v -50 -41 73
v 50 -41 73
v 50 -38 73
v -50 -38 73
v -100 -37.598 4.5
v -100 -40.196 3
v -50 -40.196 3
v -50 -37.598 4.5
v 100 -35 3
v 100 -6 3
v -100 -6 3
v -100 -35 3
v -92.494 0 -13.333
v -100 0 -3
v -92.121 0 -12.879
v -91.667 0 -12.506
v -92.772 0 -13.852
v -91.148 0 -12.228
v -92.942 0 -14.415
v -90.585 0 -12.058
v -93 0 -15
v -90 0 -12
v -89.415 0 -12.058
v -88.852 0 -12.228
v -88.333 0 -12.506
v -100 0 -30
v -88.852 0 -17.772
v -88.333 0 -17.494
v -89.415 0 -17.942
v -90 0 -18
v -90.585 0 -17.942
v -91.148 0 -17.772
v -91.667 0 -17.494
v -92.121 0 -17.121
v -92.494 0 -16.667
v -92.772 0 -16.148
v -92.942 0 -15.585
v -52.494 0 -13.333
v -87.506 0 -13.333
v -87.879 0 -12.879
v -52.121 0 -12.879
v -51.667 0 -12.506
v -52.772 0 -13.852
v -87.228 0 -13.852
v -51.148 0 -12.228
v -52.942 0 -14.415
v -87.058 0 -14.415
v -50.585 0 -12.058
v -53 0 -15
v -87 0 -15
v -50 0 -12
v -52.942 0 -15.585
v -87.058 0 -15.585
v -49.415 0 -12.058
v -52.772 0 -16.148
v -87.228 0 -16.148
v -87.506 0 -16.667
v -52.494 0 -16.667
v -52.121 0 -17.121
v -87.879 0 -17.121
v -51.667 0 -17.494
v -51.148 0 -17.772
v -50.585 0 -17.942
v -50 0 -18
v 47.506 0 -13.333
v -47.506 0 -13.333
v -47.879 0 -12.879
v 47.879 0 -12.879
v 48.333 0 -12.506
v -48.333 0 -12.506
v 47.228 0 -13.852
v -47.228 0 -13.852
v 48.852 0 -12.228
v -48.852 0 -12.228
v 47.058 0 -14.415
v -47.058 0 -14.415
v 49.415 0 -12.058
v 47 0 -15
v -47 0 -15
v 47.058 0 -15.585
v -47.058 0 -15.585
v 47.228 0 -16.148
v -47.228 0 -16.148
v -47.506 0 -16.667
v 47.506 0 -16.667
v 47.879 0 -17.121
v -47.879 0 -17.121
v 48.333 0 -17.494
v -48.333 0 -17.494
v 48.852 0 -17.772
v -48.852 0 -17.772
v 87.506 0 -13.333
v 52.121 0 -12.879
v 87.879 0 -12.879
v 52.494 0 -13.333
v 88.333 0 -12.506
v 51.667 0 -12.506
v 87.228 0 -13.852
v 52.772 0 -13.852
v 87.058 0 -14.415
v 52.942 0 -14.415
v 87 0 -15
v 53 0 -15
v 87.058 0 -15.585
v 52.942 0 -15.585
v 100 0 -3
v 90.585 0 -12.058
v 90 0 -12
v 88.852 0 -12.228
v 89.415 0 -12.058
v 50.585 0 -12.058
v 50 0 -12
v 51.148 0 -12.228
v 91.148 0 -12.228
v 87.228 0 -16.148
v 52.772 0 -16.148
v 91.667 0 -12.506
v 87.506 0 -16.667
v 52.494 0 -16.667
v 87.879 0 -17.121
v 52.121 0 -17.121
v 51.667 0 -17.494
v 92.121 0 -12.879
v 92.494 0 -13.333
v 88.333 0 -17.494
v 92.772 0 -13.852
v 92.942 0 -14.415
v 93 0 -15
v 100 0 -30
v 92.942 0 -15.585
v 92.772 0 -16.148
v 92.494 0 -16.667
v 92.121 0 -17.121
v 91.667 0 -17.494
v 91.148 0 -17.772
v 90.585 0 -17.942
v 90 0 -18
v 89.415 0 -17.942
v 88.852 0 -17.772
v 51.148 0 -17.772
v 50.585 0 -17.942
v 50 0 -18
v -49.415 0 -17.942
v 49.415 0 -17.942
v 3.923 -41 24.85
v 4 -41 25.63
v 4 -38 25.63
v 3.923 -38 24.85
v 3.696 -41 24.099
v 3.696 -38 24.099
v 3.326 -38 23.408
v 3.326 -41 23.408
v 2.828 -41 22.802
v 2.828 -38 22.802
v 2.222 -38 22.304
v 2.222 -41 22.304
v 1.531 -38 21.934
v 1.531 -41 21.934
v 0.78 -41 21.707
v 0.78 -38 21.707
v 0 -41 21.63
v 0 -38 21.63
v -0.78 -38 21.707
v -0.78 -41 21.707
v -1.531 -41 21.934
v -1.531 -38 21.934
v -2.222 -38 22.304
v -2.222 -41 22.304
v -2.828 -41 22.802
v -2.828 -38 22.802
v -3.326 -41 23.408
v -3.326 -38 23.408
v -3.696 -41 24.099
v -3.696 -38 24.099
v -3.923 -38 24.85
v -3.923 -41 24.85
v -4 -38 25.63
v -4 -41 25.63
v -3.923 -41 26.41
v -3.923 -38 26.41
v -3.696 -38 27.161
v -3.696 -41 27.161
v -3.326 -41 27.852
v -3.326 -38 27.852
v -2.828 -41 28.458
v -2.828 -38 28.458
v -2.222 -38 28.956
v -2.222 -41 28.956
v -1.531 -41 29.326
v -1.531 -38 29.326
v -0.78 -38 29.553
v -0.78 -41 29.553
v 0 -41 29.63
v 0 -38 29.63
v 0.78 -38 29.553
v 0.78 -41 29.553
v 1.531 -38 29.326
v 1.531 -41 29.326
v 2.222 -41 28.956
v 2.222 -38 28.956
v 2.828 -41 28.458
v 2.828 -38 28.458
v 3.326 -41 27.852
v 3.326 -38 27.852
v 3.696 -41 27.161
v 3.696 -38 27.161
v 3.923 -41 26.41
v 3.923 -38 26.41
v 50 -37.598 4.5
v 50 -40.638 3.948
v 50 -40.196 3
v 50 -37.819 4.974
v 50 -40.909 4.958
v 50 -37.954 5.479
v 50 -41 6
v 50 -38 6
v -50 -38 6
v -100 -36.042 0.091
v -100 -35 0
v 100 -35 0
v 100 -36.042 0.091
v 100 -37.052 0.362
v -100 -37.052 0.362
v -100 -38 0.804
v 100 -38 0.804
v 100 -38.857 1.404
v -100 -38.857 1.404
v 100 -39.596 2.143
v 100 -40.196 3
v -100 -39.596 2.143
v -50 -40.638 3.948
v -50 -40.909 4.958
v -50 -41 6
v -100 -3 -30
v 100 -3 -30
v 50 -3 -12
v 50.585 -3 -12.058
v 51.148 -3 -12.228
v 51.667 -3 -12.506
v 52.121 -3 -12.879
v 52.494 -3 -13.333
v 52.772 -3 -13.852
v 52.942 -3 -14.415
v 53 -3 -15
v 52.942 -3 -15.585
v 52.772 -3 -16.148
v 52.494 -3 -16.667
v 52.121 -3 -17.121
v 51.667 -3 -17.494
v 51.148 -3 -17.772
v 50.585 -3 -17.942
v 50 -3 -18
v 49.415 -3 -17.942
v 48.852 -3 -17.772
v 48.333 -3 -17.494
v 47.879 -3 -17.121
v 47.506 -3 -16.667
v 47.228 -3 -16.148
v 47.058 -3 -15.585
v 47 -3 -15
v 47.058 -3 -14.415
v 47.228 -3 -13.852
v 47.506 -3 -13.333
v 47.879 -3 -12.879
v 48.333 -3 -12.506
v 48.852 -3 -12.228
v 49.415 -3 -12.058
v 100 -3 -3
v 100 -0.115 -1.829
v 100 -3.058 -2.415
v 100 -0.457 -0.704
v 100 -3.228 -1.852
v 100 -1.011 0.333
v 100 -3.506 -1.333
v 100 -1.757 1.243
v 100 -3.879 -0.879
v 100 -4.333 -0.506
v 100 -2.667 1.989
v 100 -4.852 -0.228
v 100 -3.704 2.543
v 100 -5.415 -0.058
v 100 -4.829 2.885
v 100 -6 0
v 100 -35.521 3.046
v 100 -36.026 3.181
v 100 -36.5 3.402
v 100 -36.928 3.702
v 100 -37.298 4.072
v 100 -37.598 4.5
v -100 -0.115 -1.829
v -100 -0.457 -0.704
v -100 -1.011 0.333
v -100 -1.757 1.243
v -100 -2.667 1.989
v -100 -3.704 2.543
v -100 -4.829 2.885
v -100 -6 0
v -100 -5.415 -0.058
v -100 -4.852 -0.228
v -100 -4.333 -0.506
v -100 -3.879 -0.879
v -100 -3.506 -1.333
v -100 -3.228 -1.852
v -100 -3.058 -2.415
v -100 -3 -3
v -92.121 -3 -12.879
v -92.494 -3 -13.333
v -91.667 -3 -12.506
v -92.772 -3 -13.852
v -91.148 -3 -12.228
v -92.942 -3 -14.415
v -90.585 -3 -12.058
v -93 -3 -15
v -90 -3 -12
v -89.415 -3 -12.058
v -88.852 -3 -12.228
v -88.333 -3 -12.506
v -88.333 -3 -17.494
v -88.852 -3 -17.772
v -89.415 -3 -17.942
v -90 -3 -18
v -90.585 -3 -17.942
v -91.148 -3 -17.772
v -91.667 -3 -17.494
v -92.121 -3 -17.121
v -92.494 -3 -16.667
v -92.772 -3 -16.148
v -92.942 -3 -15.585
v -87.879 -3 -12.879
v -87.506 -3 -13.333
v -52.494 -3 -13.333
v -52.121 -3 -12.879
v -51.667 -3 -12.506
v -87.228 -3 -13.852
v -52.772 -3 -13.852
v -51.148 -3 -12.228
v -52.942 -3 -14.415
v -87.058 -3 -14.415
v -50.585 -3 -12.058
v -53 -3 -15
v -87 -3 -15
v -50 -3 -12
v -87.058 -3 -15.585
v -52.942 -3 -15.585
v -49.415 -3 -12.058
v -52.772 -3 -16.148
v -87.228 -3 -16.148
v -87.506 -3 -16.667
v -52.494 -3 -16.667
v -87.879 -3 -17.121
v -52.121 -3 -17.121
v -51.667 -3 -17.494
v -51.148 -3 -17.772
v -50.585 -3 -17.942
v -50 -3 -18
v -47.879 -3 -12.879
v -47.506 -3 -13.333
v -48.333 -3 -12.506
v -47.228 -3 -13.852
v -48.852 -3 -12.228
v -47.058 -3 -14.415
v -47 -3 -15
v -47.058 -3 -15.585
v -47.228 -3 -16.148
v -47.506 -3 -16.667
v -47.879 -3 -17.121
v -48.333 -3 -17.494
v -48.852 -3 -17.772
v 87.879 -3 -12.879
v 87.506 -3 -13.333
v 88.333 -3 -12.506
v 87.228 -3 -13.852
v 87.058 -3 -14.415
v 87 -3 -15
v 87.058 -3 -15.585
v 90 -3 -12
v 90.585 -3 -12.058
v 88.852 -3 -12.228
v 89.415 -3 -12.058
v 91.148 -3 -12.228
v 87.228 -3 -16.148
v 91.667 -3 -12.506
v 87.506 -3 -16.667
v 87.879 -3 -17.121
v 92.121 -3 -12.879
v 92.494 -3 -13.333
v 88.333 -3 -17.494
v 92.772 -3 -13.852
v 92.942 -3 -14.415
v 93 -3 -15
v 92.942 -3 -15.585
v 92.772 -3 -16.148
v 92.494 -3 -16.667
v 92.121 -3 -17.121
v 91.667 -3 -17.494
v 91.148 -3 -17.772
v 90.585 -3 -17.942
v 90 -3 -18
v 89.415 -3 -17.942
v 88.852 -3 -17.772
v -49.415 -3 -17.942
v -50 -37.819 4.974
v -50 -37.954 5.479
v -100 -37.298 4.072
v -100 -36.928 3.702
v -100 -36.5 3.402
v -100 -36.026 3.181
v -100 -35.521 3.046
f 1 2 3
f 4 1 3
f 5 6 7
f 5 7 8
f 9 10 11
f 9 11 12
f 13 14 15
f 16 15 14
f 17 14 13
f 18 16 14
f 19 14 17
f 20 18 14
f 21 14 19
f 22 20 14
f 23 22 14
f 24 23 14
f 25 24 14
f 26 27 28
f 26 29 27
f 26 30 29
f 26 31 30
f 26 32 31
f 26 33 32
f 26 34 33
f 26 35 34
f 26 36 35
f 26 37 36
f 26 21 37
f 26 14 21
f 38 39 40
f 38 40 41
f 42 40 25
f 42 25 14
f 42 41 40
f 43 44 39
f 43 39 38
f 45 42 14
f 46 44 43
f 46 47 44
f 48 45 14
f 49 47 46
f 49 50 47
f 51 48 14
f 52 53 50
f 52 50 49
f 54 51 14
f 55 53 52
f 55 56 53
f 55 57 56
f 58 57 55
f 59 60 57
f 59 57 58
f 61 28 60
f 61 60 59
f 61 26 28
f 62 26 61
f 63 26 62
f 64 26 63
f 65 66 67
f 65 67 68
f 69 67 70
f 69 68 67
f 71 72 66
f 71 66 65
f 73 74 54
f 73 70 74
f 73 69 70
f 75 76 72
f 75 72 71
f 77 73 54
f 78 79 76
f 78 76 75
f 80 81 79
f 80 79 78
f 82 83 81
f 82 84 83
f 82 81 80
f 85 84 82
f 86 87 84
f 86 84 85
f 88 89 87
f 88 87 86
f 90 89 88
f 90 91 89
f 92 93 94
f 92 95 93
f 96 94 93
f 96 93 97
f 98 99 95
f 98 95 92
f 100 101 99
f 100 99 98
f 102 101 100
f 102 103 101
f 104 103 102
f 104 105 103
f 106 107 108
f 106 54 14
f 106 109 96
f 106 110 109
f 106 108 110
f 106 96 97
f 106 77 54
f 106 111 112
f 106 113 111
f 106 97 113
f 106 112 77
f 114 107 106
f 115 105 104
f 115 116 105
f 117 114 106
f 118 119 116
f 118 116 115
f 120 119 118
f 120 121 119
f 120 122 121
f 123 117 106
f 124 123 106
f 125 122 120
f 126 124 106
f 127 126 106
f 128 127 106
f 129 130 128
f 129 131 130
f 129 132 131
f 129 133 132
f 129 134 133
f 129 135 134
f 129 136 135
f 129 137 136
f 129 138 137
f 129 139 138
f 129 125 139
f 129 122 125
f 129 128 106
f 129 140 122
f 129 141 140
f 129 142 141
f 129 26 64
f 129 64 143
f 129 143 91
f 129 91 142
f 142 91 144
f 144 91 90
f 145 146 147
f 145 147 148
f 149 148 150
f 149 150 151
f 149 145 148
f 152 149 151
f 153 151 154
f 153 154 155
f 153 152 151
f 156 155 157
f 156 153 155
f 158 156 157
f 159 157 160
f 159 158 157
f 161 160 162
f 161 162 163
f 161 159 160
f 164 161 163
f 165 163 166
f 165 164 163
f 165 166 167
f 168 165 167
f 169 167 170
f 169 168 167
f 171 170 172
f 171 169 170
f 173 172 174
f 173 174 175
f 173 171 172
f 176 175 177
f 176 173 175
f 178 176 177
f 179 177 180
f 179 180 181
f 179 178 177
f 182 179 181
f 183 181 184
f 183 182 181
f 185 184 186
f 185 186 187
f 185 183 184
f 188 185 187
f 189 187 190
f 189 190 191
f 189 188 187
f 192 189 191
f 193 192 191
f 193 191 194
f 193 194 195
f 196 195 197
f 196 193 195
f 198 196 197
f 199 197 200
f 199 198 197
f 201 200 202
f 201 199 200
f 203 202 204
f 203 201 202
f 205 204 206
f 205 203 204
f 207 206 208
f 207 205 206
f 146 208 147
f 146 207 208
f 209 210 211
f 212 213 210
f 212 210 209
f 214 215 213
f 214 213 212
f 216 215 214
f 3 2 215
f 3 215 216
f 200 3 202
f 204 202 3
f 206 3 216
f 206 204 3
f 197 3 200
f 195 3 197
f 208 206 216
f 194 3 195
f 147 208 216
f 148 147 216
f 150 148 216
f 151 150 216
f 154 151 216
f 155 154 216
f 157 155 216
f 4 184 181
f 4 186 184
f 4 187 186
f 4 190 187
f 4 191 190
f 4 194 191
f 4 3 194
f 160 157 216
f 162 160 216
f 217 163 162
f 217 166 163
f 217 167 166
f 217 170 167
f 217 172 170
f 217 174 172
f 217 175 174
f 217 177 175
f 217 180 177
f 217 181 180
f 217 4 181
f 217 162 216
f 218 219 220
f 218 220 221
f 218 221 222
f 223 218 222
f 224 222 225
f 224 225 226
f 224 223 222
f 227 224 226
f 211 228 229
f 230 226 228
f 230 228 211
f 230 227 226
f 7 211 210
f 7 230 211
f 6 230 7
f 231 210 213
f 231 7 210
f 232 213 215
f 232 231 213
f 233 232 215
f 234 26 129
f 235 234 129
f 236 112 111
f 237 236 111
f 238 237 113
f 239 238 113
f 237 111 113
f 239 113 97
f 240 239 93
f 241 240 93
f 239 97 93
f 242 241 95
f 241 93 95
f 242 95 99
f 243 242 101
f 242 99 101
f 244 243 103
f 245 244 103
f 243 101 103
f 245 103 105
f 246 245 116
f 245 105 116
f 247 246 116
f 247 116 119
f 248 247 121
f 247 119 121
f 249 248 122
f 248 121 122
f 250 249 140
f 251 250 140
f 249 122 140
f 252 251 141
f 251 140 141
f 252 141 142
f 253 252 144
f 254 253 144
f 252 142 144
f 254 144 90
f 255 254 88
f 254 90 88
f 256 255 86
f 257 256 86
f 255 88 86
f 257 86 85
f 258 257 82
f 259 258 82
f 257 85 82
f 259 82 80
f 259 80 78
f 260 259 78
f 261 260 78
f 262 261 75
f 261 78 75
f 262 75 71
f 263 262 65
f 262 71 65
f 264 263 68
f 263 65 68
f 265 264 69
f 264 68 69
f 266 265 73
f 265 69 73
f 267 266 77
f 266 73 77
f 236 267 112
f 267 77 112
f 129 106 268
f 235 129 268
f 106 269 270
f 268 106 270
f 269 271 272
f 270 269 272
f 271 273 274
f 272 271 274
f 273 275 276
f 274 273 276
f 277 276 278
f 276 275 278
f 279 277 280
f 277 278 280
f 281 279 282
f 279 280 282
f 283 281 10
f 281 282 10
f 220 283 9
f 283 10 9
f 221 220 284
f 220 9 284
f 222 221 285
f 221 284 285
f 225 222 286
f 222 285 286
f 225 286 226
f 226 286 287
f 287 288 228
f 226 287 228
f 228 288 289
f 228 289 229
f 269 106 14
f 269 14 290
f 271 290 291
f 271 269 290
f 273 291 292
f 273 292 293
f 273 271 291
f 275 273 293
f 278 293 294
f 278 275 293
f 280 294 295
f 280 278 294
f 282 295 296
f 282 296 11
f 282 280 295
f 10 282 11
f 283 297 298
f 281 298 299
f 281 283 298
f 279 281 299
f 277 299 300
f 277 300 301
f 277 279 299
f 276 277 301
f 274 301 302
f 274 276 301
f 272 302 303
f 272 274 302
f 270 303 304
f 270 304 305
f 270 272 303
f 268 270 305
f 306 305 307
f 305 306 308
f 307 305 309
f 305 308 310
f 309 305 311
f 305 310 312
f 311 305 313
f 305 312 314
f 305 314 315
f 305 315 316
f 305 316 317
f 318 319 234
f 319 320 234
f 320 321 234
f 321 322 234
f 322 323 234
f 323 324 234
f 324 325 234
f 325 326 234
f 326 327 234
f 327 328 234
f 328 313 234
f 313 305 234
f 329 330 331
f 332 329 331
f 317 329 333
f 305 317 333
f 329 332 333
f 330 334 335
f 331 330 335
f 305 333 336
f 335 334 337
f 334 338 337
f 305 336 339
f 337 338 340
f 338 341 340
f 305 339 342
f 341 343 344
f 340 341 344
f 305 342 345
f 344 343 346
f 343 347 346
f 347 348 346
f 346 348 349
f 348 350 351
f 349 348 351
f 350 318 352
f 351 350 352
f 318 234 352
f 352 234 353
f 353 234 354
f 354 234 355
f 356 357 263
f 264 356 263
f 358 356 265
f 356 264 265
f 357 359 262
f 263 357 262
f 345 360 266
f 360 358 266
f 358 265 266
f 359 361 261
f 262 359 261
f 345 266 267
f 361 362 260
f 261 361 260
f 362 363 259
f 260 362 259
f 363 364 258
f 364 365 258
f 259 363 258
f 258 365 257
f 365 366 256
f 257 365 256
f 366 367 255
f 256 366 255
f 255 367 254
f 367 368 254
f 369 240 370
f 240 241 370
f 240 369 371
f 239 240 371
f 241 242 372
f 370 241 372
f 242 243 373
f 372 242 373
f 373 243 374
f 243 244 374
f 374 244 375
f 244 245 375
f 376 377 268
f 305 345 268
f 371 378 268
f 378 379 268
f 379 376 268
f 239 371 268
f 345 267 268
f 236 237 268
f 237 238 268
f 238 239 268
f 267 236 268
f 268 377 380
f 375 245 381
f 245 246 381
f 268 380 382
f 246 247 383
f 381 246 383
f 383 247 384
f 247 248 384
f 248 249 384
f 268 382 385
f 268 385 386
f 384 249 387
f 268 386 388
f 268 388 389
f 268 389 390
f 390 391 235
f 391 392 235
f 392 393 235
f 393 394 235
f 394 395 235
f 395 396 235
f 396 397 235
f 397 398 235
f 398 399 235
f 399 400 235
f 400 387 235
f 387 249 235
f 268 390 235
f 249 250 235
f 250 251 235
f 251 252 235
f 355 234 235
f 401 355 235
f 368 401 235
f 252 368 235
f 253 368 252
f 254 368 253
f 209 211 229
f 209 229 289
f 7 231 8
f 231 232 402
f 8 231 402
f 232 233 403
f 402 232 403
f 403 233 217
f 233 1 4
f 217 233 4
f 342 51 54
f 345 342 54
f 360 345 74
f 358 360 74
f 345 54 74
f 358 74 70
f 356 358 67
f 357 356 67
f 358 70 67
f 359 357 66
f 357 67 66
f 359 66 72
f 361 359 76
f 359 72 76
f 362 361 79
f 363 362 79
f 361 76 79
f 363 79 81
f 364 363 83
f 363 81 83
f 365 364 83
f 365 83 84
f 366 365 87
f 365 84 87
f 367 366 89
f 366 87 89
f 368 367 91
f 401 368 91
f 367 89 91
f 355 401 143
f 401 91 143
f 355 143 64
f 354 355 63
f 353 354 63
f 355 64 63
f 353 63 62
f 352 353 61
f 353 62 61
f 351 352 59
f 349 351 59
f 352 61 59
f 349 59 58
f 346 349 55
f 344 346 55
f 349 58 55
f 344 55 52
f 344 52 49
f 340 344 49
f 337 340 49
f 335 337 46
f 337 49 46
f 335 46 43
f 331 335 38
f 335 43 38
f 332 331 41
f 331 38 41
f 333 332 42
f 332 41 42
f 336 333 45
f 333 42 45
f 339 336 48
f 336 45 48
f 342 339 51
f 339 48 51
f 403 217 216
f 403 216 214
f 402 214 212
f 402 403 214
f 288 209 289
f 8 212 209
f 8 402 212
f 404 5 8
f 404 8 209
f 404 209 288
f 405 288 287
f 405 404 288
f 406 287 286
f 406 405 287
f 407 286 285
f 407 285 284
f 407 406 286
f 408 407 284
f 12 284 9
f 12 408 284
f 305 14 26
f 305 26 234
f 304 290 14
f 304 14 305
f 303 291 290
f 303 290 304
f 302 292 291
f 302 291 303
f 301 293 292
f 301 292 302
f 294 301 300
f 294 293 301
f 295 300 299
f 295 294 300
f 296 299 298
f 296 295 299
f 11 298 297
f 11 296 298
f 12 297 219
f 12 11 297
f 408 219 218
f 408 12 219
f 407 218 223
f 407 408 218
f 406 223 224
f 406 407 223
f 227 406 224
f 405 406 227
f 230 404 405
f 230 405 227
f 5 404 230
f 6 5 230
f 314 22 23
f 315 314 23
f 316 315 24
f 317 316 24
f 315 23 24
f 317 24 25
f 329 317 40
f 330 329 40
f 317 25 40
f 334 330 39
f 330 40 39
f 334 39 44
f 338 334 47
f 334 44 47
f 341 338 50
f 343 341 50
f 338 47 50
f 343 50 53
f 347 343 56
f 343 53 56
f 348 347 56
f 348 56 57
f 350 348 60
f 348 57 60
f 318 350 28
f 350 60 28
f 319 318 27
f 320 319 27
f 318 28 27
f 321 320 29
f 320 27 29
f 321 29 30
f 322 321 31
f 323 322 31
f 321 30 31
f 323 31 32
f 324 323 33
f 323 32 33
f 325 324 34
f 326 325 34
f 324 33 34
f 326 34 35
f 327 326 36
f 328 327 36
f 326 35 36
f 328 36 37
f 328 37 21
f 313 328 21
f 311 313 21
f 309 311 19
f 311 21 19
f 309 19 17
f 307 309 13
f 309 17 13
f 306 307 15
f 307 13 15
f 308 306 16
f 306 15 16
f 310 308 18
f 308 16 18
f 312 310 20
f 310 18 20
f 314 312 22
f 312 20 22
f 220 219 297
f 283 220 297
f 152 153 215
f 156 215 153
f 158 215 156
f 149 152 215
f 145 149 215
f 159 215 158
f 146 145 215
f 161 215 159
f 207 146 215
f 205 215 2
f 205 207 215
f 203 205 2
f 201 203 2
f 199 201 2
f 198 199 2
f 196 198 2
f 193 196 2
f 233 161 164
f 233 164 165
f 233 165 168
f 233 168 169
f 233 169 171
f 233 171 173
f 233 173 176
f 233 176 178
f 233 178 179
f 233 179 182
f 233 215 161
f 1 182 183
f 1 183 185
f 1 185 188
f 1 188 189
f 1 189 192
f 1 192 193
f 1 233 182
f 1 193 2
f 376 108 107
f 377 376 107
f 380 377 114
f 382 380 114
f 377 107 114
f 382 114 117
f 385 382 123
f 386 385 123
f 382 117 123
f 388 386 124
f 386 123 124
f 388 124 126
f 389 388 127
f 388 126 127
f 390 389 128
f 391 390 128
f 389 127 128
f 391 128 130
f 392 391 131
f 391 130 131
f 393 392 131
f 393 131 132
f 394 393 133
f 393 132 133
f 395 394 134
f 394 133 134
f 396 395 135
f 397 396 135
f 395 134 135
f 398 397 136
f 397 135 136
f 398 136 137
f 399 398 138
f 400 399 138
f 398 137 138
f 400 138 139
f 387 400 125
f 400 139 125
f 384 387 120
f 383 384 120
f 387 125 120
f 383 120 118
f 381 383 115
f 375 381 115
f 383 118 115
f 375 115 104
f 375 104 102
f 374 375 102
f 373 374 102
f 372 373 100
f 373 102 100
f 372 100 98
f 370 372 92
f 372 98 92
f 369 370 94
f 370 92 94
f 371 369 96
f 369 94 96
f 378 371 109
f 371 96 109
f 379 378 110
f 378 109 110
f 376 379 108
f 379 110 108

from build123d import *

# Parameters (mm, degrees)
SKETCH9_W                    = 200
SKETCH9_H                    = 30
BASE_FLANGE2_DEPTH           = 3
EDGE_FLANGE1_STRIP_W         = 18
EDGE_FLANGE1_STRIP_H         = 3
EDGE_FLANGE1_STRIP_CUT_DEPTH = 200
EDGE_FLANGE1_DEPTH           = 200
EDGE_FLANGE2_STRIP_W         = 18
EDGE_FLANGE2_STRIP_H         = 3
EDGE_FLANGE2_STRIP_CUT_DEPTH = 200
EDGE_FLANGE2_DEPTH           = 200
CUT_EXTRUDE1_START           = -3
CUT_EXTRUDE1_OUTLINE_R       = 4
CUT_EXTRUDE1_DEPTH           = 3
CUT_EXTRUDE1_START_2         = -100
CUT_EXTRUDE1_2_DEPTH         = 50
CUT_EXTRUDE1_START_3         = 50
CUT_EXTRUDE1_3_DEPTH         = 50
SKETCH19_R                   = 3
CUT_EXTRUDE2_DEPTH           = 3


# Read off the part's stored shape, not the designer's step: Cut-Extrude1
# Sheet-metal steps are written as plain solids
with BuildPart() as part:
    # Sketch9 → Base-Flange2 (new body)
    with BuildSketch(Plane(origin=(0, 0, 0), x_dir=(1, 0, 0), z_dir=(0, 1, 0))):
        with Locations((0, 15)):
            Rectangle(SKETCH9_W, SKETCH9_H)
    extrude(amount=-BASE_FLANGE2_DEPTH)

    # Edge-Flange1 strip (across the edge) → Edge-Flange1 strip cut (cut)
    with BuildSketch(Plane(origin=(100, -3, 0), x_dir=(0, 0, -1), z_dir=(-1, 0, 0))):
        with Locations((-6, -1.5)):
            Rectangle(EDGE_FLANGE1_STRIP_W, EDGE_FLANGE1_STRIP_H)
    extrude(amount=EDGE_FLANGE1_STRIP_CUT_DEPTH, mode=Mode.SUBTRACT)

    # Edge-Flange1 section (across the edge) → Edge-Flange1 (add)
    with BuildSketch(Plane(origin=(100, -3, 0), x_dir=(0, 0, -1), z_dir=(-1, 0, 0))):
        with BuildLine():
            Line((-3, 3), (-3, 35))
            Line((-3, 35), (0, 35))
            Line((0, 35), (0, 3))
            ThreePointArc((0, 3), (0.878679656, 0.878679656), (3, 0))
            Line((3, 0), (3, -3))
            ThreePointArc((3, -3), (-1.242640687, -1.242640687), (-3, 3))
        make_face()
    extrude(amount=EDGE_FLANGE1_DEPTH)

    # Edge-Flange2 strip (across the edge) → Edge-Flange2 strip cut (cut)
    with BuildSketch(Plane(origin=(-100, -38, 3), x_dir=(0, 1, 0), z_dir=(1, 0, 0))):
        with Locations((-6, -1.5)):
            Rectangle(EDGE_FLANGE2_STRIP_W, EDGE_FLANGE2_STRIP_H)
    extrude(amount=EDGE_FLANGE2_STRIP_CUT_DEPTH, mode=Mode.SUBTRACT)

    # Edge-Flange2 section (across the edge) → Edge-Flange2 (add)
    with BuildSketch(Plane(origin=(-100, -38, 3), x_dir=(0, 1, 0), z_dir=(1, 0, 0))):
        with BuildLine():
            Line((-3, 3), (-3, 70))
            Line((-3, 70), (0, 70))
            Line((0, 70), (0, 3))
            ThreePointArc((0, 3), (0.878679656, 0.878679656), (3, 0))
            Line((3, 0), (3, -3))
            ThreePointArc((3, -3), (-1.242640687, -1.242640687), (-3, 3))
        make_face()
    extrude(amount=EDGE_FLANGE2_DEPTH)

    # Cut-Extrude1 outline → Cut-Extrude1 (cut)
    with BuildSketch(Plane(origin=(0, -38, 0), x_dir=(1, 0, 0), z_dir=(0, 1, 0)).offset(CUT_EXTRUDE1_START)):
        with Locations((0, -25.63)):
            Circle(CUT_EXTRUDE1_OUTLINE_R)
    extrude(amount=CUT_EXTRUDE1_DEPTH, mode=Mode.SUBTRACT)

    # Cut-Extrude1 2 outline → Cut-Extrude1 2 (cut)
    with BuildSketch(Plane.YZ.offset(CUT_EXTRUDE1_START_2)):
        with BuildLine():
            ThreePointArc((-41, 6), (-40.795554958, 4.447085729), (-40.196152423, 3))
            Line((-40.196152423, 3), (-37.598076212, 4.5))
            ThreePointArc((-37.598076212, 4.5), (-37.897777479, 5.223542864), (-38, 6))
            Line((-38, 6), (-38, 73))
            Line((-38, 73), (-41, 73))
            Line((-41, 73), (-41, 6))
        make_face()
    extrude(amount=CUT_EXTRUDE1_2_DEPTH, mode=Mode.SUBTRACT)

    # Cut-Extrude1 3 outline → Cut-Extrude1 3 (cut)
    with BuildSketch(Plane.YZ.offset(CUT_EXTRUDE1_START_3)):
        with BuildLine():
            ThreePointArc((-41, 6), (-40.795554958, 4.447085729), (-40.196152423, 3))
            Line((-40.196152423, 3), (-37.598076212, 4.5))
            ThreePointArc((-37.598076212, 4.5), (-37.897777479, 5.223542864), (-38, 6))
            Line((-38, 6), (-38, 73))
            Line((-38, 73), (-41, 73))
            Line((-41, 73), (-41, 6))
        make_face()
    extrude(amount=CUT_EXTRUDE1_3_DEPTH, mode=Mode.SUBTRACT)

    # Sketch19 → Cut-Extrude2 (cut)
    with BuildSketch(Plane(origin=(0, 0, 0), x_dir=(1, 0, 0), z_dir=(0, 1, 0))):
        with Locations(Location((-90, 15, 0), (0, 0, 270))):
            Circle(SKETCH19_R)
        with Locations(Location((-50, 15, 0), (0, 0, 270))):
            Circle(SKETCH19_R)
        with Locations(Location((50, 15, 0), (0, 0, 270))):
            Circle(SKETCH19_R)
        with Locations(Location((90, 15, 0), (0, 0, 270))):
            Circle(SKETCH19_R)
    extrude(amount=-CUT_EXTRUDE2_DEPTH, mode=Mode.SUBTRACT)


solid = part.part
